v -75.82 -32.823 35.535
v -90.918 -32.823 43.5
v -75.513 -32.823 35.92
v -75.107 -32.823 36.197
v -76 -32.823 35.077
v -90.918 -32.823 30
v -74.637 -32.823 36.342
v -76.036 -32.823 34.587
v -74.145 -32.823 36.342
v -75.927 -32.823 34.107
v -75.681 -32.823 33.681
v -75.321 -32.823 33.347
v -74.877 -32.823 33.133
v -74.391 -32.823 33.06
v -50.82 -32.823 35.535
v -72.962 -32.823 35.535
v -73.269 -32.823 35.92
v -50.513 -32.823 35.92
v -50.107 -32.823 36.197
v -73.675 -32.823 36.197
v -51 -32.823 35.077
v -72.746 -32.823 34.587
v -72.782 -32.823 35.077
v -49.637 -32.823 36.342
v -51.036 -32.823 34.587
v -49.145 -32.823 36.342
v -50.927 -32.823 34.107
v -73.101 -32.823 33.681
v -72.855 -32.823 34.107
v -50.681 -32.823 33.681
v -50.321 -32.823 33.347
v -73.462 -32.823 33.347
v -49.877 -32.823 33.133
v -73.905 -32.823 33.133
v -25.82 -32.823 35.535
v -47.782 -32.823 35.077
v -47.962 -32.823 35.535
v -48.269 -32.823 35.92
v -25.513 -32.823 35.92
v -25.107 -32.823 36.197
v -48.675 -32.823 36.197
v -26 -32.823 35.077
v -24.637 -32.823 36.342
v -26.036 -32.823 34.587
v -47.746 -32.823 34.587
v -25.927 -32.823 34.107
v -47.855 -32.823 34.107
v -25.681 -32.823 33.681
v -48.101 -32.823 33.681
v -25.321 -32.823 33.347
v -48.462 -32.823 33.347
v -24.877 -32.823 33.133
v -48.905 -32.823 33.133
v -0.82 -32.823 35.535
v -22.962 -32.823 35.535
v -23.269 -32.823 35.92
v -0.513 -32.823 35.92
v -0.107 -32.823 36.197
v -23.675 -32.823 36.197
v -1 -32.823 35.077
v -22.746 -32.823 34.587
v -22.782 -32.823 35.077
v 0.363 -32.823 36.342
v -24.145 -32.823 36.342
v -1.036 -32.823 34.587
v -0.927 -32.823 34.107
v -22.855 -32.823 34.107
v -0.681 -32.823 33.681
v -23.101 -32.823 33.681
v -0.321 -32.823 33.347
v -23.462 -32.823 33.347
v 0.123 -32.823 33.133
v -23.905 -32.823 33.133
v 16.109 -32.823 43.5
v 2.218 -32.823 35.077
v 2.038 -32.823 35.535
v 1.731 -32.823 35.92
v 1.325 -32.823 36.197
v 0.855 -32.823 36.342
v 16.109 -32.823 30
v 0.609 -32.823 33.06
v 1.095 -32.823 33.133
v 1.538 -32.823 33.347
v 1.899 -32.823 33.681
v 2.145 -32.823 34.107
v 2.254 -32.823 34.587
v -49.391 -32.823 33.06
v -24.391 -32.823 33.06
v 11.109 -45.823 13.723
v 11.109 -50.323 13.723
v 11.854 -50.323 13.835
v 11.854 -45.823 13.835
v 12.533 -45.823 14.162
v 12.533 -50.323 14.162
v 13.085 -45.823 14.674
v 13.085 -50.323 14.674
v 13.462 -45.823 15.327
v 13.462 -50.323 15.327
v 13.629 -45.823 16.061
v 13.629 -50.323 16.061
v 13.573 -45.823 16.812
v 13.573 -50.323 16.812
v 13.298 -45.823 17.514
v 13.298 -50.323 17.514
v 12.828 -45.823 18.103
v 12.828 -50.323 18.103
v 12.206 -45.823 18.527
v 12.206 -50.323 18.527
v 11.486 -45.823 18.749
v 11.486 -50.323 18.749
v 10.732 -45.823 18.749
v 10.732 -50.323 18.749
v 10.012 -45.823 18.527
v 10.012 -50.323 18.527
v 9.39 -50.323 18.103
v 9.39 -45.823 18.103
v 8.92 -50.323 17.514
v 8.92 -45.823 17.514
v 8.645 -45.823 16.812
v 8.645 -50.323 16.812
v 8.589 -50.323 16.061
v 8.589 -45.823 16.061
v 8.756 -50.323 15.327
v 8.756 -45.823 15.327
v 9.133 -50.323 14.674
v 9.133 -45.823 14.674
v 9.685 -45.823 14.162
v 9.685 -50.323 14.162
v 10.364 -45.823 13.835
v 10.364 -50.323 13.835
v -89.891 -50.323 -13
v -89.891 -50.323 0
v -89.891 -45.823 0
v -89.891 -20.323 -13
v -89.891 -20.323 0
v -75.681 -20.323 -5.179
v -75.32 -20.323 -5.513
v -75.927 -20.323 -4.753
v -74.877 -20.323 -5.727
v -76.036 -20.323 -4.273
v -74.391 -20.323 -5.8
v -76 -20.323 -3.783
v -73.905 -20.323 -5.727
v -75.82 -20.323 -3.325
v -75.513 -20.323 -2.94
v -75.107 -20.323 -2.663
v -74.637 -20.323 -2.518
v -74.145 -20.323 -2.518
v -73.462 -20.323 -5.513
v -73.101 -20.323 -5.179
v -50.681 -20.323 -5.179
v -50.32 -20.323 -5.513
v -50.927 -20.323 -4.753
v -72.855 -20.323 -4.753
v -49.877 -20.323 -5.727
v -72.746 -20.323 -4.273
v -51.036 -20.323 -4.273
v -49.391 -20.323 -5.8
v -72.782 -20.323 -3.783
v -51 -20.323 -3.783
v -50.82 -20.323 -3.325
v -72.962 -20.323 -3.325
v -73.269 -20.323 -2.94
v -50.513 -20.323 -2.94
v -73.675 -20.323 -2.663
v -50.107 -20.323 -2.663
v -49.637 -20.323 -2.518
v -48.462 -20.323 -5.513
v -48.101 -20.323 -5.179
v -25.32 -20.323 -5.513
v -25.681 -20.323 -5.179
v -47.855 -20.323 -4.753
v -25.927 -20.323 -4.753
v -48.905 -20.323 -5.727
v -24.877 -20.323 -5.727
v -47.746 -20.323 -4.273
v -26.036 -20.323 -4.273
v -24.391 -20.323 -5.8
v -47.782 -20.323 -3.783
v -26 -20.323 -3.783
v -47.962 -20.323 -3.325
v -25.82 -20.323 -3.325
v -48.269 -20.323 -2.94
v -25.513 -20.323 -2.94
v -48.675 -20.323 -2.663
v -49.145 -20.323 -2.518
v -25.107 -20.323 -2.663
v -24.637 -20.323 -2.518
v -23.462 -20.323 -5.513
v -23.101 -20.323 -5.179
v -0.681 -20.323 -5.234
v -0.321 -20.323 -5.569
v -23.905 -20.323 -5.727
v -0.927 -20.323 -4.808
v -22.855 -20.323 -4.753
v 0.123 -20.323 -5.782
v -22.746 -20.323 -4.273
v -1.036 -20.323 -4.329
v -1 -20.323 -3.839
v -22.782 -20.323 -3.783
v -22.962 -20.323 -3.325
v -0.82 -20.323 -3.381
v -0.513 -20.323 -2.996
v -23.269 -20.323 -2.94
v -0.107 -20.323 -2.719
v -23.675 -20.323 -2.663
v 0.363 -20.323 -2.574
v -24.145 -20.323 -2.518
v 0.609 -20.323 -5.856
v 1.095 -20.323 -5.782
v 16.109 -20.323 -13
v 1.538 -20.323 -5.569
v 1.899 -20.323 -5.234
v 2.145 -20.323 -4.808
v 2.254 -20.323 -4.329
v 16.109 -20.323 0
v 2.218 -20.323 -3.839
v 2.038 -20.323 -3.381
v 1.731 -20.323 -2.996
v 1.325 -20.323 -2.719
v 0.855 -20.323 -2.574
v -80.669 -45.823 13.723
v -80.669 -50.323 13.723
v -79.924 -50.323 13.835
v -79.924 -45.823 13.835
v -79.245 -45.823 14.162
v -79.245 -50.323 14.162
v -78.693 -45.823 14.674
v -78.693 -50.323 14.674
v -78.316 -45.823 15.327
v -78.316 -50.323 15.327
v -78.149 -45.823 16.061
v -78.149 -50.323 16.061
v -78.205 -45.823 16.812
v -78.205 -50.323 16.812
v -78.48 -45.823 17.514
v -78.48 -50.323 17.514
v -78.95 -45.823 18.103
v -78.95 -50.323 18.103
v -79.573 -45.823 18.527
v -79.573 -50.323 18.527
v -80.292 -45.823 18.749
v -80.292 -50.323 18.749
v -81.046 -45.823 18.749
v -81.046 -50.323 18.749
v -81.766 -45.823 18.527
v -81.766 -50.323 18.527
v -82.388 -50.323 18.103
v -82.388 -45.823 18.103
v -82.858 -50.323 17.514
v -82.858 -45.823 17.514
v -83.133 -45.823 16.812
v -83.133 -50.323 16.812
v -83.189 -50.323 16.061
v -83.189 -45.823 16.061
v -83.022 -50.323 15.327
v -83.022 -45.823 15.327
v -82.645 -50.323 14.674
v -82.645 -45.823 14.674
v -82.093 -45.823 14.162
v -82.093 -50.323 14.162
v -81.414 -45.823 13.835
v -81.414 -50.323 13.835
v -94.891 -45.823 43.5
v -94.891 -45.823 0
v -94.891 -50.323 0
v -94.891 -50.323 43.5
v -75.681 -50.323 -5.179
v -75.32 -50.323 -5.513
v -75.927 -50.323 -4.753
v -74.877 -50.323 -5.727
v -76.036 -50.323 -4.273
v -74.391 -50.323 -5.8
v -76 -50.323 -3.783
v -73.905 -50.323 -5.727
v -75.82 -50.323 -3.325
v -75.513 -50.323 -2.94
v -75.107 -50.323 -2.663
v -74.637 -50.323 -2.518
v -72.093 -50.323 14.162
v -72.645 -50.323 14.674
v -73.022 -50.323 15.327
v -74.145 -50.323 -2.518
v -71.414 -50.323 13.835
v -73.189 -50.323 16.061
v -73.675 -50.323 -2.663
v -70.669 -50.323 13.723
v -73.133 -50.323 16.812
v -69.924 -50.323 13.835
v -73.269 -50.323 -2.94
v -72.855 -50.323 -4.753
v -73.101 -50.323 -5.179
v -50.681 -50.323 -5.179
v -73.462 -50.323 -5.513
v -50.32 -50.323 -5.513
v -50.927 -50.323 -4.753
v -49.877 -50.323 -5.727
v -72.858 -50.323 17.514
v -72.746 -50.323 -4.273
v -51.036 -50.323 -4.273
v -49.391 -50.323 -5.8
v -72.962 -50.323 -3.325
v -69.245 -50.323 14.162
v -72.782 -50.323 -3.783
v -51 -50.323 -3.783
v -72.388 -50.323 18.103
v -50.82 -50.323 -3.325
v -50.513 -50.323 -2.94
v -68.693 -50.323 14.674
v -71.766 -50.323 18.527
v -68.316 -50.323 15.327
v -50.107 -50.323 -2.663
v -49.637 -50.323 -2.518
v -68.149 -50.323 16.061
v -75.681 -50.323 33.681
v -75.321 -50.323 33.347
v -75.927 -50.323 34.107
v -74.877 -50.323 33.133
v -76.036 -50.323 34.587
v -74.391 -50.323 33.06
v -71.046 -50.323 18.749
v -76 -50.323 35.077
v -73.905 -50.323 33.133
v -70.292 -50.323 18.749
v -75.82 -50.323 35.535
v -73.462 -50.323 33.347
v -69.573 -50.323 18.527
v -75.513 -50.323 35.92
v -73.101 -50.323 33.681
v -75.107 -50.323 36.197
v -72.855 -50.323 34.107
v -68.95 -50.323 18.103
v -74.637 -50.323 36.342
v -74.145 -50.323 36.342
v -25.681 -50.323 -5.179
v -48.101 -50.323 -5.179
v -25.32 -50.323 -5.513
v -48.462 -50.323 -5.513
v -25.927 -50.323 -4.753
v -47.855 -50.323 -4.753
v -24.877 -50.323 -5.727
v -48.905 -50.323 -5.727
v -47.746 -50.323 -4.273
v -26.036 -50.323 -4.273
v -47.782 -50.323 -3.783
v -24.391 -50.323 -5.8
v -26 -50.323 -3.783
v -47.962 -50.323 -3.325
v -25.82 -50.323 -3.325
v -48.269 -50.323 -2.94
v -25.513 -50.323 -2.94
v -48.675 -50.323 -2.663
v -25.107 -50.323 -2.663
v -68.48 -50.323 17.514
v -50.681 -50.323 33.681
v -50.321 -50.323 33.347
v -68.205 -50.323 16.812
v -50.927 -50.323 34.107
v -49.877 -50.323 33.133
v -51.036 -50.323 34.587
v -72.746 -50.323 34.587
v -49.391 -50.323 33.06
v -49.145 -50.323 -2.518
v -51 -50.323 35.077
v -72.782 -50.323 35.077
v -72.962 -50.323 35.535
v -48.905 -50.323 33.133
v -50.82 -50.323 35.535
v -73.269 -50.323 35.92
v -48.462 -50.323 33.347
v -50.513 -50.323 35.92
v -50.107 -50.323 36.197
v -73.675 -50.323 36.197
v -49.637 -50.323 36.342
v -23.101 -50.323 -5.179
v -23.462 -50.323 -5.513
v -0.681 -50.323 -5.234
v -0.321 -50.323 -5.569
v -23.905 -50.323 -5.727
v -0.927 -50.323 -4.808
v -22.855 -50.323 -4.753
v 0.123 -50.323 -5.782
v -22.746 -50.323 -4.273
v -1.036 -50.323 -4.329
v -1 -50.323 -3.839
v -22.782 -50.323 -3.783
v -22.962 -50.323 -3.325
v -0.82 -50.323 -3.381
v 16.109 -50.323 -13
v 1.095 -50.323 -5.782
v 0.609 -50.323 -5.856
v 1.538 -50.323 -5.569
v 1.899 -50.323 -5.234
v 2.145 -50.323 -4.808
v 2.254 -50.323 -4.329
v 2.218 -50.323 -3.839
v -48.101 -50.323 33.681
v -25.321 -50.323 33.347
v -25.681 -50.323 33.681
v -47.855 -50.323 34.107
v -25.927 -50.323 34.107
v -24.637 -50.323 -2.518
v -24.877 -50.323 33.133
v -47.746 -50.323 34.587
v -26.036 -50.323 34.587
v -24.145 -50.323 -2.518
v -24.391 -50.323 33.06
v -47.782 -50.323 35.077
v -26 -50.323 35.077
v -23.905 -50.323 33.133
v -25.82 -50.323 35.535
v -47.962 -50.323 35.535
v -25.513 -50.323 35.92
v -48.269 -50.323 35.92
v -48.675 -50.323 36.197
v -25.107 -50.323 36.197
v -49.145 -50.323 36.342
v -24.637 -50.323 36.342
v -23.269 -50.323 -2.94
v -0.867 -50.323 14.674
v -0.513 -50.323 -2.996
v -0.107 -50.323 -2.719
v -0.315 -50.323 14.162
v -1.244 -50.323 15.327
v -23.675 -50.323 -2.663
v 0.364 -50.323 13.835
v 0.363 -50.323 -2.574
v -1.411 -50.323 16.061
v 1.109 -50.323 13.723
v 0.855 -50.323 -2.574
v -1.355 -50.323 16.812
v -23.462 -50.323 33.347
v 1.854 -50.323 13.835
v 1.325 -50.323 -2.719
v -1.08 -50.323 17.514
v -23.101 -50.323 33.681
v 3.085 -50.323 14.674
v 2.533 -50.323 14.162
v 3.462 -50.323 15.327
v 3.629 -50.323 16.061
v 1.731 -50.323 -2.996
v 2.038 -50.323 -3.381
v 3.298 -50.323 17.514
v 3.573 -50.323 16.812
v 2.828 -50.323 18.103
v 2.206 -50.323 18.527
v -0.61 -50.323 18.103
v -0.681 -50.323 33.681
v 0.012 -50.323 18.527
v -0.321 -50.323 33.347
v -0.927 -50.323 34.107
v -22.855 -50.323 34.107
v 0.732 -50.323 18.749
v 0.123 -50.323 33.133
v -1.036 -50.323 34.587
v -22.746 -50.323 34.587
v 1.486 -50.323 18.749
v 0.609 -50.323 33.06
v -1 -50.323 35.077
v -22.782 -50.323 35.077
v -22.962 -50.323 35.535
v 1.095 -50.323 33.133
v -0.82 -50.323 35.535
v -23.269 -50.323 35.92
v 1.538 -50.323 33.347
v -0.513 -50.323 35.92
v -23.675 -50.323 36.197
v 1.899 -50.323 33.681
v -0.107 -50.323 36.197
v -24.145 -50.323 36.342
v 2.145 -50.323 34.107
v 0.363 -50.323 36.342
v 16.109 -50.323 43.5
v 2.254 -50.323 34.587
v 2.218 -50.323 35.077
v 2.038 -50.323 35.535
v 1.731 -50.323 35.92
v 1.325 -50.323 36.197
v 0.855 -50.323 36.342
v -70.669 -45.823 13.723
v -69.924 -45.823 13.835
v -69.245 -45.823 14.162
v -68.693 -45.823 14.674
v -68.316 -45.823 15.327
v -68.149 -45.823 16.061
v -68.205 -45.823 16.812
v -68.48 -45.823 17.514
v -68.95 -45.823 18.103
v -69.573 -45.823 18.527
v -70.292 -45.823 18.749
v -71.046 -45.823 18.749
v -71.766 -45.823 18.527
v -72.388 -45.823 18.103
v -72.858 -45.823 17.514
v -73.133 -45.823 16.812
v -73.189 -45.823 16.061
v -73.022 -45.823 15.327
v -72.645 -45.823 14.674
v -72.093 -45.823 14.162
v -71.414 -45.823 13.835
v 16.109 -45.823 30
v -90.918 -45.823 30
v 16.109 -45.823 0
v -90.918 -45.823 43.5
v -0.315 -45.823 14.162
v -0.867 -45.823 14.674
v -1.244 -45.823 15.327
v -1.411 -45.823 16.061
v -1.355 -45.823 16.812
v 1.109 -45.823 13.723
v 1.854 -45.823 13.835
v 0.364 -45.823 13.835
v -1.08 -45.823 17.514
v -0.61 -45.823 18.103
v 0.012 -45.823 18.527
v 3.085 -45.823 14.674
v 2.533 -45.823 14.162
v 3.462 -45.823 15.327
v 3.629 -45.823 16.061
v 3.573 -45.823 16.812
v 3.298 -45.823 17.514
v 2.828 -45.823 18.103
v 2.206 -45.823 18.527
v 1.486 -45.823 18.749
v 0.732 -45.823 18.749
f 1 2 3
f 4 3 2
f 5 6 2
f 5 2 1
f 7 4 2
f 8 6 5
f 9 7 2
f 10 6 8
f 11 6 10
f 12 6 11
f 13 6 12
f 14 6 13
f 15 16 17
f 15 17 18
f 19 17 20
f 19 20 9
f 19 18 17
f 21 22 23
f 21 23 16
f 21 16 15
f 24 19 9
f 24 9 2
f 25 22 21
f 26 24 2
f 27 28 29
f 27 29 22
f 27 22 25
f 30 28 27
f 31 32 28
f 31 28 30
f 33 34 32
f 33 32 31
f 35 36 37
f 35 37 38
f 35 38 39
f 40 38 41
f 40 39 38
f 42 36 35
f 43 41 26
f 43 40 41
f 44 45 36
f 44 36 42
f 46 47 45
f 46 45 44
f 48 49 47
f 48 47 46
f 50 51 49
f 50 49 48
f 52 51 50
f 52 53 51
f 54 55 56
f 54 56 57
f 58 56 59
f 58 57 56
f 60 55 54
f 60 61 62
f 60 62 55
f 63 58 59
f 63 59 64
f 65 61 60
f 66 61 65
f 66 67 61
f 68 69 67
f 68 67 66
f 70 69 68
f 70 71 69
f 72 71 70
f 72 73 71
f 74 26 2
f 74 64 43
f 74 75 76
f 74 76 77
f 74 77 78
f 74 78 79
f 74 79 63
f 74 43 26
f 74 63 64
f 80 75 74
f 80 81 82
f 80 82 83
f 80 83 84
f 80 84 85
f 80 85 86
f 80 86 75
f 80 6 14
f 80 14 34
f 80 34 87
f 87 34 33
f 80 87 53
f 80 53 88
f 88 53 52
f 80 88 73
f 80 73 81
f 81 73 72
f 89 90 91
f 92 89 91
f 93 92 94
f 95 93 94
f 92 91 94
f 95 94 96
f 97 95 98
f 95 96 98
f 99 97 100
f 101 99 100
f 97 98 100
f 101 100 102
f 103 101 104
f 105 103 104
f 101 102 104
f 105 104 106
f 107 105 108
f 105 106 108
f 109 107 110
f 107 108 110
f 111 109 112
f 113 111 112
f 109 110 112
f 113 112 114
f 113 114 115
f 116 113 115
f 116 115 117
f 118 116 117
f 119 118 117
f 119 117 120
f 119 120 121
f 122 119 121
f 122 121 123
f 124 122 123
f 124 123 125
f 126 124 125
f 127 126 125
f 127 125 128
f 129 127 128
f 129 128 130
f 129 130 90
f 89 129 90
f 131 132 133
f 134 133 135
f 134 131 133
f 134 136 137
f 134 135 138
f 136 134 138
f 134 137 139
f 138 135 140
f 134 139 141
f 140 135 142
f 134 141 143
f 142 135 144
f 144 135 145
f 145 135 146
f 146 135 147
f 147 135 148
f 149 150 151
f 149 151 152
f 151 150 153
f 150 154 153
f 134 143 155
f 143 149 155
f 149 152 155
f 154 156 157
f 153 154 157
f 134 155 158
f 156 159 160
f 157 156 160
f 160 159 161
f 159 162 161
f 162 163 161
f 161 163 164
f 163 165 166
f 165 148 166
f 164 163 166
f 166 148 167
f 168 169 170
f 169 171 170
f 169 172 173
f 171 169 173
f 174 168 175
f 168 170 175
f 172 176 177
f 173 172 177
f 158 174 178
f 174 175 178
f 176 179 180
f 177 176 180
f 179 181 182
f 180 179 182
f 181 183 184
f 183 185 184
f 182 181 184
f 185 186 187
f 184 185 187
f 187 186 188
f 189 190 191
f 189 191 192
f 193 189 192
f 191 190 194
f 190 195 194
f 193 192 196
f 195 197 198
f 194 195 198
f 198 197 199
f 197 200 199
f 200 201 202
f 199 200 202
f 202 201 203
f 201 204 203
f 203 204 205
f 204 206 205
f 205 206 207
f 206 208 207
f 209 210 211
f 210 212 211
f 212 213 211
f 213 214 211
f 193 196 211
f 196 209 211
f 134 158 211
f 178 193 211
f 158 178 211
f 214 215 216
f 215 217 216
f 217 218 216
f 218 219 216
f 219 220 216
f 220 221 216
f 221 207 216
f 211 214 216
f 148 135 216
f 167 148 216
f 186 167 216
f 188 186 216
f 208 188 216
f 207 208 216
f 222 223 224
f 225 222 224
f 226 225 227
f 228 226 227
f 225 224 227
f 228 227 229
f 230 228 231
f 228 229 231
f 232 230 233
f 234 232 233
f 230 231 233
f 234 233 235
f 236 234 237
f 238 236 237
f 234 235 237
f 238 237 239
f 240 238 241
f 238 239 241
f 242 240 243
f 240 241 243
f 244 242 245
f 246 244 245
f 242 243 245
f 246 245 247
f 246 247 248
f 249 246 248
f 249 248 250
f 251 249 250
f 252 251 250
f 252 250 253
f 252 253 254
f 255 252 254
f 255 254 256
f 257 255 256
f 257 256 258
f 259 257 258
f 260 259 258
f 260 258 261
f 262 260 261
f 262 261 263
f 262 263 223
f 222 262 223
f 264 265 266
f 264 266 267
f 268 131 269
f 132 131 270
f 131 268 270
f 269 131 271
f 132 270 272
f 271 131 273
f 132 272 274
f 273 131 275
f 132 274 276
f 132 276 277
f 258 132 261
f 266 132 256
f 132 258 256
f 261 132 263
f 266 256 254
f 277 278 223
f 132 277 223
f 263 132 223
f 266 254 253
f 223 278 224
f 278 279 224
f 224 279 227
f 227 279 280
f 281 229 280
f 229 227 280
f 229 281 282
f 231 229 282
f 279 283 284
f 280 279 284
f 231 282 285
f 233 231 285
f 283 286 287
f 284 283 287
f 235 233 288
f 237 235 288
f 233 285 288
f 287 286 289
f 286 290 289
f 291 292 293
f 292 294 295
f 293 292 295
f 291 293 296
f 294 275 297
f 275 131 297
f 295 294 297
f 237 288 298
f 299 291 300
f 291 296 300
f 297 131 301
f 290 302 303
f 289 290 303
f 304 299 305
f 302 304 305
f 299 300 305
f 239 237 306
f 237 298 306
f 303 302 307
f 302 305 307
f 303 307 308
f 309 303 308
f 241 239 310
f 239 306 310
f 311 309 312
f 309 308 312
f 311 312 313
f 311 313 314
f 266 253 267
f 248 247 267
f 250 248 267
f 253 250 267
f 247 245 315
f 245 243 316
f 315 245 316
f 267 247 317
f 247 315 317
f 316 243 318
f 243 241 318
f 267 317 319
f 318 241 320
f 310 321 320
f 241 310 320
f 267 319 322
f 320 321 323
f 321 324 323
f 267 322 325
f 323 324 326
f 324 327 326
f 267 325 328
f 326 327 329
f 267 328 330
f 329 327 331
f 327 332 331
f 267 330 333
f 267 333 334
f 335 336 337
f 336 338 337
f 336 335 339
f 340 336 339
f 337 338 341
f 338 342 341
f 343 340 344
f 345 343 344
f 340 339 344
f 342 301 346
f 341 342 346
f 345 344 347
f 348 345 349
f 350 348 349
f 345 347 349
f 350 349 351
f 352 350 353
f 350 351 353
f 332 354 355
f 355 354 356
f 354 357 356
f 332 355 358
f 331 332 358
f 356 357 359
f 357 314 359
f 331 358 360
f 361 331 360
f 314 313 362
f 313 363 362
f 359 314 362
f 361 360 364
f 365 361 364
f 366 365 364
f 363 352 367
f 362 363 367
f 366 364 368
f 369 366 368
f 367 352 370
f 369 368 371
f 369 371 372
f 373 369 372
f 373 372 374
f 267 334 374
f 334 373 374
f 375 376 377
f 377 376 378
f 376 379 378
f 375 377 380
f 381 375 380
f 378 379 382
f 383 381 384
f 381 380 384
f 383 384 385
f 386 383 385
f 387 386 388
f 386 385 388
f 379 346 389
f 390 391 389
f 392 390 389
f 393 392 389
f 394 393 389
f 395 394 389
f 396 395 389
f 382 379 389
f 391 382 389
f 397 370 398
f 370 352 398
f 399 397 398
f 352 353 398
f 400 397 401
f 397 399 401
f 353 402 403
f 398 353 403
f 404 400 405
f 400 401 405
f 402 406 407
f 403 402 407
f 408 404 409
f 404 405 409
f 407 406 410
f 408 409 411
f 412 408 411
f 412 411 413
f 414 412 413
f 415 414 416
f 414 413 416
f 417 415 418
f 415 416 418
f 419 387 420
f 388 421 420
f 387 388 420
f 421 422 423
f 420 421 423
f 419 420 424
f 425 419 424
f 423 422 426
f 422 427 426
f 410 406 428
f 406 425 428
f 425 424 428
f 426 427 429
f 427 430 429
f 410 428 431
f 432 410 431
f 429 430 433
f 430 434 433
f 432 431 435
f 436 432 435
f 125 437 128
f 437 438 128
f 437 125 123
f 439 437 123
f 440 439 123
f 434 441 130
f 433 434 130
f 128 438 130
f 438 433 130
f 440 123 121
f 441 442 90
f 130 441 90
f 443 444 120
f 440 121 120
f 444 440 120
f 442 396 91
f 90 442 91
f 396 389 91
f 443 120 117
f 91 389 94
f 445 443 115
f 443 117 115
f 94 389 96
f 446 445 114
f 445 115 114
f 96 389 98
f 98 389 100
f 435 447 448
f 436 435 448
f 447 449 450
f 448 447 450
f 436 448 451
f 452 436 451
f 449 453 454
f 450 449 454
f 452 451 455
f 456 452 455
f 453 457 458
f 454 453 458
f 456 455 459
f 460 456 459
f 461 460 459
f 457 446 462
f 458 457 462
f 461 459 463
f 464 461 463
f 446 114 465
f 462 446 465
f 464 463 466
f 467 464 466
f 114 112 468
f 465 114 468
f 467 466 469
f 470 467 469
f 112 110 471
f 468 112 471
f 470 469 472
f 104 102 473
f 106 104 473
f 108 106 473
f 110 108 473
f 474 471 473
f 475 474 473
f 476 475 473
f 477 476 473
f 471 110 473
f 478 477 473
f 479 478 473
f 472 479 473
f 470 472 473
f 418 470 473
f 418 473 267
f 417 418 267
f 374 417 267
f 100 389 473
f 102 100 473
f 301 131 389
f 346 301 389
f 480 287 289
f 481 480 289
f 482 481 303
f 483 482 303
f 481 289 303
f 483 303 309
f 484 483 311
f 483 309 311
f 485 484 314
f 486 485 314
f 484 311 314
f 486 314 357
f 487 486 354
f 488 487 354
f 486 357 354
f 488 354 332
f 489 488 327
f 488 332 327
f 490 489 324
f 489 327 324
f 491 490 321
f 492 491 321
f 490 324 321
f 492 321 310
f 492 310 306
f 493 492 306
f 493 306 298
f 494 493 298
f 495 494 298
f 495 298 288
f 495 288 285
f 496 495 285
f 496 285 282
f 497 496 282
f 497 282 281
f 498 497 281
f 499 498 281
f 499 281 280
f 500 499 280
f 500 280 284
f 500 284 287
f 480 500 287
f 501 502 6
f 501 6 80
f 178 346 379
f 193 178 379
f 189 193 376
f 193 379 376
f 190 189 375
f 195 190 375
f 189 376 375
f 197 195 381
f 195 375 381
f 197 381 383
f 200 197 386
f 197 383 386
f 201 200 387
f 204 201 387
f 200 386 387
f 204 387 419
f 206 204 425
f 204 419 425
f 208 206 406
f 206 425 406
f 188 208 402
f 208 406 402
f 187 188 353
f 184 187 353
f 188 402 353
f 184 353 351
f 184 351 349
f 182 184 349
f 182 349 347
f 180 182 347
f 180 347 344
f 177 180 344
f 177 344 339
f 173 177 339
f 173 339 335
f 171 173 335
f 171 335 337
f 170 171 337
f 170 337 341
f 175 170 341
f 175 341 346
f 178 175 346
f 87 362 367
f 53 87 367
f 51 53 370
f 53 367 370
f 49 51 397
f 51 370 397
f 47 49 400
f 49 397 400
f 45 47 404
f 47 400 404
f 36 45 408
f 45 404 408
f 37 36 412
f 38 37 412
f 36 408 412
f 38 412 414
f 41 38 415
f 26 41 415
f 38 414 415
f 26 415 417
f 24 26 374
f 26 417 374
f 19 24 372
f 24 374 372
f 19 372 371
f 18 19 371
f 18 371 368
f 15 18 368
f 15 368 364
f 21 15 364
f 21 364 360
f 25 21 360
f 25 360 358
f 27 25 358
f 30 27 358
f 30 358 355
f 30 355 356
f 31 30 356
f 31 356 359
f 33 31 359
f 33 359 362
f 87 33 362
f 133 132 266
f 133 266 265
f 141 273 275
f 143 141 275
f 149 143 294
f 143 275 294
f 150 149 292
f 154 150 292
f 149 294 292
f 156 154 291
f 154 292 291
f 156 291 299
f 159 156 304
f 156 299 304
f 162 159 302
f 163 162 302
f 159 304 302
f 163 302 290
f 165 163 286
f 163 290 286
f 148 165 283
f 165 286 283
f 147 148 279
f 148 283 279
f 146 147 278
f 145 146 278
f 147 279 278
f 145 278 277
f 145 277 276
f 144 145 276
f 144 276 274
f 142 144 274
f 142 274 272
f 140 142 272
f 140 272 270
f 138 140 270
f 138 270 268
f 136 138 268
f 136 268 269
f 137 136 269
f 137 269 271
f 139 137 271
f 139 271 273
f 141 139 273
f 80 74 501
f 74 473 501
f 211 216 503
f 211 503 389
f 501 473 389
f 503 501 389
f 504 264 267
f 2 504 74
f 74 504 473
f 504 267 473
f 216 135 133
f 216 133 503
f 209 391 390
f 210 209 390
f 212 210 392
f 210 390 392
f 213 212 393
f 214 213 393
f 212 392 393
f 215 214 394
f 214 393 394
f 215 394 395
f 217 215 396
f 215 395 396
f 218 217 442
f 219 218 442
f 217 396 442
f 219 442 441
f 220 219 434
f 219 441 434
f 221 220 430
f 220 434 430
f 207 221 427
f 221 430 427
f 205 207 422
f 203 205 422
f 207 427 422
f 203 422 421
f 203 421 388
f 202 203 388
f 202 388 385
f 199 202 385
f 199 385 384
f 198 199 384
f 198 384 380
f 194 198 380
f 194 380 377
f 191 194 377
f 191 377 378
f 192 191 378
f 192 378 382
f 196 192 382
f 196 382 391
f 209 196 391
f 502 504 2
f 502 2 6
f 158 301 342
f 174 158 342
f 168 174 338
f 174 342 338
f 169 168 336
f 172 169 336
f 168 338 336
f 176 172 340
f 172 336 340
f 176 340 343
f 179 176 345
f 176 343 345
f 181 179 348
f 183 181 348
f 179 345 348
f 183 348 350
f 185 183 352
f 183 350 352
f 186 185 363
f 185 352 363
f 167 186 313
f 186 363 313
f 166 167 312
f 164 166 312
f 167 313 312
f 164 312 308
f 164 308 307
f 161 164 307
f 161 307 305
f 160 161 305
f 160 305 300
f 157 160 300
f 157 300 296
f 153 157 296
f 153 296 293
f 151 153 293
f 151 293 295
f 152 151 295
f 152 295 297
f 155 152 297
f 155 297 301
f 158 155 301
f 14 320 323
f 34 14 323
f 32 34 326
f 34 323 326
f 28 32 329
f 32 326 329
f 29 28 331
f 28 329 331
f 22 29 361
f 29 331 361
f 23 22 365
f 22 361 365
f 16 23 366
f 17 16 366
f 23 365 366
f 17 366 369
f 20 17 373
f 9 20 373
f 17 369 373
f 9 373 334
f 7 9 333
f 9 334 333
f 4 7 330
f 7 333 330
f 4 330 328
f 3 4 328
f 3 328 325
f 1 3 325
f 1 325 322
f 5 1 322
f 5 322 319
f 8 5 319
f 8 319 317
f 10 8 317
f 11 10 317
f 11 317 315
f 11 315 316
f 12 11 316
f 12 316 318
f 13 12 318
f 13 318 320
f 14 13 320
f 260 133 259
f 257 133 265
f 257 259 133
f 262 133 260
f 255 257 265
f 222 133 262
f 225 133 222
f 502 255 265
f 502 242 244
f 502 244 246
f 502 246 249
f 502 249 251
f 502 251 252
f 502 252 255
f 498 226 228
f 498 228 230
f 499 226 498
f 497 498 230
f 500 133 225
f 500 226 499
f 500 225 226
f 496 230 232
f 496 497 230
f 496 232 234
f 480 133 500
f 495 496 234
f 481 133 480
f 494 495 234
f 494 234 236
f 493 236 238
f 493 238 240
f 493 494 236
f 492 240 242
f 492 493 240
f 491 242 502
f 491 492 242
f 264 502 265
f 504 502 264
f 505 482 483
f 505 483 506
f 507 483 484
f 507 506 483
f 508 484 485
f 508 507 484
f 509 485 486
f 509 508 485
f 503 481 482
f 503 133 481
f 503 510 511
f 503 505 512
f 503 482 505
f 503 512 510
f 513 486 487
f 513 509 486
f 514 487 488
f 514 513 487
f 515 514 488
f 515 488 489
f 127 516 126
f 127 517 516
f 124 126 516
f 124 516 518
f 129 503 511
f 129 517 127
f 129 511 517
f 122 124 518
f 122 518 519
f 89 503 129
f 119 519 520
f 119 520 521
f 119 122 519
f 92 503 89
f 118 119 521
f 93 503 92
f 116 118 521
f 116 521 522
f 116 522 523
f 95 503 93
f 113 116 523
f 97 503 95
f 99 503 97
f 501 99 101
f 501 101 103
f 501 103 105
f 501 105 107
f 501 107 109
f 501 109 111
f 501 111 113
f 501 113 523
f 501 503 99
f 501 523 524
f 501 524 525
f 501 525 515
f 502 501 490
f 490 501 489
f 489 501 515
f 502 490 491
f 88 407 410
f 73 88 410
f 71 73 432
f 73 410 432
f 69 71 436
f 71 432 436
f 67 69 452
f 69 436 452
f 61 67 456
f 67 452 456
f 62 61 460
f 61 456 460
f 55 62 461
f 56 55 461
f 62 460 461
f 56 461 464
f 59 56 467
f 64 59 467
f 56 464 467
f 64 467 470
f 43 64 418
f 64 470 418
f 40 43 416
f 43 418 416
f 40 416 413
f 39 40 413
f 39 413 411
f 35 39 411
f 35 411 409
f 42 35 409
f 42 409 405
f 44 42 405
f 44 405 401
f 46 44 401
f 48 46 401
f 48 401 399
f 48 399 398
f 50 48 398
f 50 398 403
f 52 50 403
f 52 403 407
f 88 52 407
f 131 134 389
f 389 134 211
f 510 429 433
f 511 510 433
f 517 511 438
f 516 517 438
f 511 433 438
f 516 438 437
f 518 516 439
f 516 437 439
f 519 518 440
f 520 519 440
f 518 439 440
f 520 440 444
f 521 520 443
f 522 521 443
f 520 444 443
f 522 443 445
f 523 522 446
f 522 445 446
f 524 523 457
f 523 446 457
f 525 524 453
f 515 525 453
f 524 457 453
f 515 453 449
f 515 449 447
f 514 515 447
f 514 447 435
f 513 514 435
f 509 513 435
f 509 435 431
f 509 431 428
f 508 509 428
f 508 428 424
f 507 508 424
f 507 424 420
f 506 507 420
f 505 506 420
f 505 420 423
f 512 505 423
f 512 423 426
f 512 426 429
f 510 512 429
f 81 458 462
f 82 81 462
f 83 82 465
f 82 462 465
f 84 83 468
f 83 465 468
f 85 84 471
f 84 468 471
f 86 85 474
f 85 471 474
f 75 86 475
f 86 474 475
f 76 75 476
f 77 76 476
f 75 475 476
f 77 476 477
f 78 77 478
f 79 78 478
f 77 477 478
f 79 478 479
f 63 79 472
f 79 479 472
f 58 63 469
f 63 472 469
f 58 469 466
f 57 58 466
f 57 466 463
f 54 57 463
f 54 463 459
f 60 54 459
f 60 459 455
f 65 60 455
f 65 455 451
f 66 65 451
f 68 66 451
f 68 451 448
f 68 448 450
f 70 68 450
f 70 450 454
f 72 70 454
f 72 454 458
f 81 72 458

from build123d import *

# Parameters (mm, degrees)
SKETCH4_W                  = 106
SKETCH4_H                  = 30
BOSS_EXTRUDE2_DEPTH        = 13
M4X0_7_TAPPED_HOLE1_D      = 3.3
SKETCH28_W                 = 106
SKETCH28_H                 = 4.5
BOSS_EXTRUDE3_DEPTH        = 43.5
SKETCH32_W                 = 43.5
SKETCH32_H                 = 4.5
BOSS_EXTRUDE10_DEPTH       = 5
F_8_0_199_DIAMETER_HOLE1_D = 5.0546
SKETCH44_W                 = 107.027081708
SKETCH44_H                 = 13.5
BOSS_EXTRUDE17_DEPTH       = 13
M4X0_7_TAPPED_HOLE2_D      = 3.3


with BuildPart() as part:
    # Sketch4 → Boss-Extrude2 (new body)
    with BuildSketch(Plane.XY):
        with Locations((-36.891047602, -35.322762913)):
            Rectangle(SKETCH4_W, SKETCH4_H)
    extrude(amount=-BOSS_EXTRUDE2_DEPTH)

    # M4x0.7 Tapped Hole1 (through all)
    with Locations(Plane(origin=(-74.390985602, -20.322762913, -4.15), x_dir=(0, 0, 1), z_dir=(0, 1, 0))):
        with Locations((0, 0), (0, 25), (-0.055677319, 74.999938), (0, 50)):
            Hole(M4X0_7_TAPPED_HOLE1_D / 2)

    # Sketch28 → Boss-Extrude3 (add)
    with BuildSketch(Plane.XY):
        with Locations((-36.891047602, -48.072762913)):
            Rectangle(SKETCH28_W, SKETCH28_H)
    extrude(amount=BOSS_EXTRUDE3_DEPTH)

    # Sketch32 → Boss-Extrude10 (add)
    with BuildSketch(Plane.ZY.offset(89.891047602)):
        with Locations((21.75, -48.072762913)):
            Rectangle(SKETCH32_W, SKETCH32_H)
    extrude(amount=BOSS_EXTRUDE10_DEPTH)

    # #8 (0.199) Diameter Hole1 (through all)
    with Locations(Plane(origin=(-80.669073904, -45.822762913, 16.25), x_dir=(0, 0, 1), z_dir=(0, 1, 0))):
        with Locations((0, 0), (0, 91.778026302), (0, 81.778026302), (0, 10)):
            Hole(F_8_0_199_DIAMETER_HOLE1_D / 2)

    # Sketch44 → Boss-Extrude17 (add)
    with BuildSketch(Plane(origin=(0, -45.822762913, 0), x_dir=(1, 0, 0), z_dir=(0, 1, 0))):
        with Locations((-37.404588456, -36.75)):
            Rectangle(SKETCH44_W, SKETCH44_H)
    extrude(amount=BOSS_EXTRUDE17_DEPTH)

    # M4x0.7 Tapped Hole2 (through all)
    with Locations(Plane(origin=(-74.391047602, -32.822762913, 34.71), x_dir=(0, 0, 1), z_dir=(0, 1, 0))):
        with Locations((0, 0), (0, 25), (0, 50), (0, 75)):
            Hole(M4X0_7_TAPPED_HOLE2_D / 2)


solid = part.part
